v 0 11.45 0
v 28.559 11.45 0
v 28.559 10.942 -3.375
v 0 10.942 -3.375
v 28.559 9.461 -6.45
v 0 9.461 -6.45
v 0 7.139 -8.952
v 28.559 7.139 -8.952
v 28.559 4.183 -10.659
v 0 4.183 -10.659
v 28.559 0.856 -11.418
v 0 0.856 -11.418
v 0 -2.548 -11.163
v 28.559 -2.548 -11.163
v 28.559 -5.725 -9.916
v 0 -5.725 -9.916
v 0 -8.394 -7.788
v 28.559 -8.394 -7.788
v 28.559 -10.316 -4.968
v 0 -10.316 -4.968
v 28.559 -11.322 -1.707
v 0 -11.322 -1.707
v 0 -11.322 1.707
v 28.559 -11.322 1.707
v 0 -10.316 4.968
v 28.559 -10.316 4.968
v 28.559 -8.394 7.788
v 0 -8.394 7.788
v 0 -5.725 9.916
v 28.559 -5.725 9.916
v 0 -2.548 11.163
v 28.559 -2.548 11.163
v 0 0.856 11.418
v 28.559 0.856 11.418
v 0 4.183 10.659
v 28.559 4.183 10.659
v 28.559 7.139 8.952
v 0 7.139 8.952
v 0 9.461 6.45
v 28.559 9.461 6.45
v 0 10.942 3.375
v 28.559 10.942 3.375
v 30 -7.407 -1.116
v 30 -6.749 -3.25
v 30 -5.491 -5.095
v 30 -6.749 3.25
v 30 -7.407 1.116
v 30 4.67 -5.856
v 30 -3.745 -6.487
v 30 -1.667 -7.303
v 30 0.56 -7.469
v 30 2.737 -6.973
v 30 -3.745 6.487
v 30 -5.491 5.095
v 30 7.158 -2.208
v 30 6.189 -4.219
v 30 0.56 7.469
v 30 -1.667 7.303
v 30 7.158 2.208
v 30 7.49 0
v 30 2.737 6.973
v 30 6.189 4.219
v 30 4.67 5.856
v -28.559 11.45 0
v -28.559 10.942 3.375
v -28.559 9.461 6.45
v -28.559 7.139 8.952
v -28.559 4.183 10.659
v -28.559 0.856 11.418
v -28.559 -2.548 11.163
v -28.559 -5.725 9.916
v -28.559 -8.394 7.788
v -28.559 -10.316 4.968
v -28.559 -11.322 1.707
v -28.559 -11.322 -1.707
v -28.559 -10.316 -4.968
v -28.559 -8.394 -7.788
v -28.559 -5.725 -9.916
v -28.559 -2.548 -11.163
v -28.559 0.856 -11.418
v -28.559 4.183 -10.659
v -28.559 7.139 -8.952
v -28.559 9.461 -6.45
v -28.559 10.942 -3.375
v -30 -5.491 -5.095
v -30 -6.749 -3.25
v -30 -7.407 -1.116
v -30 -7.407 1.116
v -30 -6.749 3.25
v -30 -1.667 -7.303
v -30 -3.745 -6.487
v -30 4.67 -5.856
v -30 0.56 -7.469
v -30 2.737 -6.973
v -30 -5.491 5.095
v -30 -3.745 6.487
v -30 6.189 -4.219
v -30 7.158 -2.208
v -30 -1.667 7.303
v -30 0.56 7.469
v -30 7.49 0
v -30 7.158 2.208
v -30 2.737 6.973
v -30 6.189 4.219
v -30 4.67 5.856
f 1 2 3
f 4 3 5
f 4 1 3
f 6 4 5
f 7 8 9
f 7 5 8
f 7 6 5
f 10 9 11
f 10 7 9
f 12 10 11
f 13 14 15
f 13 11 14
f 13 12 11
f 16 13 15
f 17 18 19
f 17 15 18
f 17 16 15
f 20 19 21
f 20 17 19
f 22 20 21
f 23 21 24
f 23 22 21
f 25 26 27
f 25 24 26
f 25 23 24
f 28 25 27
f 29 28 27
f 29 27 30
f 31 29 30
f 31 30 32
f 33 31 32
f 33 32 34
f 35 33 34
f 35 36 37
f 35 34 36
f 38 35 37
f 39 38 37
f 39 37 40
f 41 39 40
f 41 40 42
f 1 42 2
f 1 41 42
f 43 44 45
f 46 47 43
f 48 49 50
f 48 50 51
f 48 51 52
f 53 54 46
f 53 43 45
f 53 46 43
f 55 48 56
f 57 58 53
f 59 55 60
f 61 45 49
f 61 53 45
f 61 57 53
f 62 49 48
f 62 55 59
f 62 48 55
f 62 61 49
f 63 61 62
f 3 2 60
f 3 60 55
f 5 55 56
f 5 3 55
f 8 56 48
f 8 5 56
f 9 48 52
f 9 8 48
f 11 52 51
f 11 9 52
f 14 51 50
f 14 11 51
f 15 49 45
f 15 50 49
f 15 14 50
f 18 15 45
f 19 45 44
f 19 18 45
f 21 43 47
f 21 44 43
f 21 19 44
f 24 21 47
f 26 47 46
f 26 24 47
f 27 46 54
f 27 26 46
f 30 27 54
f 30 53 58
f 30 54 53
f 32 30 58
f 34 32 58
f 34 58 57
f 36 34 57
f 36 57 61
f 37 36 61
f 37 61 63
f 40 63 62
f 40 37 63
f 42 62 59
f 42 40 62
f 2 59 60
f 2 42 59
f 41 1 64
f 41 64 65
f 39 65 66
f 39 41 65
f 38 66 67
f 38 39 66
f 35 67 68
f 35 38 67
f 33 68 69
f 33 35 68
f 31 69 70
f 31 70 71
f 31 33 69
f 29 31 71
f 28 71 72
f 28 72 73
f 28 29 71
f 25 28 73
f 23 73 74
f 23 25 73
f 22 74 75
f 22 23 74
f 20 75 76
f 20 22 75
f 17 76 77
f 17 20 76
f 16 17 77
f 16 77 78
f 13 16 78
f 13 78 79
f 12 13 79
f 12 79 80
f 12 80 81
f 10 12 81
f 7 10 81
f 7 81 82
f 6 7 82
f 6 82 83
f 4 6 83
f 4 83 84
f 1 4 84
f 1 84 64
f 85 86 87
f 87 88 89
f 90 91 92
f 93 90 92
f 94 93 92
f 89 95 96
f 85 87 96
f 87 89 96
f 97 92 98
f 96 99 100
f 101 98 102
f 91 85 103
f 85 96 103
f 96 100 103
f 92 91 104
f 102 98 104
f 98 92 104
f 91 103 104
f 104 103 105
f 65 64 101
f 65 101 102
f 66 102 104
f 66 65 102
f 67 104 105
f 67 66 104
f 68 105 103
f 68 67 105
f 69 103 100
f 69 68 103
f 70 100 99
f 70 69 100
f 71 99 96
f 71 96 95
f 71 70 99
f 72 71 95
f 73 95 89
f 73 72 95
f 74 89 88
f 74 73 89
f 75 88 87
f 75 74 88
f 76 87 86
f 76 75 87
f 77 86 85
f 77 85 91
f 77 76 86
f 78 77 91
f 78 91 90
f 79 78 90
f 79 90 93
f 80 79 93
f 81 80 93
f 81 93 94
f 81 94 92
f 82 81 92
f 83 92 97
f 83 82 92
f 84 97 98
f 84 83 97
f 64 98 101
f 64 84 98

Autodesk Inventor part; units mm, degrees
ref_plane "YZ Plane" through (0, 0, 0) normal (1, 0, 0) x (0, 1, 0)
ref_plane "XZ Plane" through (0, 0, 0) normal (0, 1, 0) x (-1, 0, 0)
ref_plane "XY Plane" through (0, 0, 0) normal (0, 0, 1) x (1, 0, 0)
sketch "Base Body Sketch" plane through (0, 0, 0) normal (1, 0, 0) x (0, 1, 0)
  circle A0 centre (0, 0) radius 11.4503
  dimension "d5" = 22.9006
extrude "Base Body" add sketch "Base Body Sketch" along normal mid plane 60
sketch "Sketch5" plane through (30, 0, 0) normal (1, 0, 0) x (0, 0, -1)
  circle A0 centre (0, 0) radius 11.4503 projected
  circle A1 centre (0, 0) radius 9.6503
  dimension "d59" = 19.3006
surface extrude "Pitch Diameter" sketch "Sketch5" against normal through all shown no curves A1
chamfer "Chamfer1" distance 1.4413 distance2 3.96 1 edges at (30, -11.4503, 0) measured on face at (20, 11.4132, -0.9214)
chamfer "Chamfer2" distance 1.4413 distance2 3.96 1 edges at (-30, -11.4503, 0) measured on face at (-20, 11.4132, -0.9214)
sketch "Tooth Sketch" plane through (0, 0, 0) normal (0, 0, 1) x (1, 0, 0)
  line L0 (0, 21.74) -> (0, 10.96) projected
  line L1 (-38.8672, 11.5648) -> (-37.3842, 7.4903)
  line L2 (-36.1291, 7.4903) -> (-34.6461, 11.5648)
  line L3 (-50.5346, 0) -> (-37.4554, 0) projected
  line L4 (-38.8672, 11.5648) -> (-36.7566, 11.5648)
  line L5 (-36.7566, 11.5648) -> (-34.6461, 11.5648)
  line L6 (-37.3842, 7.4903) -> (-36.7566, 7.4903)
  line L7 (-36.7566, 7.4903) -> (-36.1291, 7.4903)
  line L8 (-36.7566, 9.6503) -> (-35.3429, 9.6503) construction
  line L9 (-36.7566, 11.5648) -> (-36.7566, 7.4903) construction
  dimension "d24" = 110
  dimension "d25" = 36.7566
  dimension "d26" = 1.4137
  dimension "d27" = 7.4903
  dimension "d28" = 9.6503
  dimension "d29" = 11.5648
feature "Tooth" [suppressed]
pattern_circular "Tooth Pattern" [suppressed]
feature "Left Tooth" [suppressed]
pattern_circular "Left Tooth Pattern" [suppressed]
equation "\"d6\" = da_b"
equation "\"d8\" = fd_cham1"
equation "\"d9\" = 0.5 * fd_cham2"
equation "\"d10\" = fd_cham1"
equation "\"d11\" = 0.5 * fd_cham2"
equation "\"d25\" = fd_dist"
equation "\"d26\" = 0.25 * da_px"
equation "\"d27\" = 0.5 * da_df"
equation "\"d28\" = 0.5 * da_d"
equation "\"d29\" = 0.505 * da_da"
equation "\"d32\" = fd_n"
equation "\"da_rightdir\" = 0"
equation "\"d64\" = fd_n"
equation "\"d5\" = da_da"
equation "\"d59\" = da_d"
equation "\"da_aw\" = 68.15028"
equation "\"da_b\" = 60"
equation "\"da_df\" = 14.98056"
equation "\"da_da\" = 22.90056"
equation "\"fd_cham2\" = da_da - da_df"
equation "\"fd_cham1\" = 0.181985 * fd_cham2"
equation "\"da_d\" = 19.30056"
equation "\"da_px\" = 5.65487"
equation "\"da_alfat\" = 20deg"
equation "\"d49\" = da_aw"
equation "\"d79\" = da_aw"
equation "\"fd_dist\" = 36.756634"
equation "\"fd_n\" = 13"
properties part number "Worm" material "Steel, Mild"
